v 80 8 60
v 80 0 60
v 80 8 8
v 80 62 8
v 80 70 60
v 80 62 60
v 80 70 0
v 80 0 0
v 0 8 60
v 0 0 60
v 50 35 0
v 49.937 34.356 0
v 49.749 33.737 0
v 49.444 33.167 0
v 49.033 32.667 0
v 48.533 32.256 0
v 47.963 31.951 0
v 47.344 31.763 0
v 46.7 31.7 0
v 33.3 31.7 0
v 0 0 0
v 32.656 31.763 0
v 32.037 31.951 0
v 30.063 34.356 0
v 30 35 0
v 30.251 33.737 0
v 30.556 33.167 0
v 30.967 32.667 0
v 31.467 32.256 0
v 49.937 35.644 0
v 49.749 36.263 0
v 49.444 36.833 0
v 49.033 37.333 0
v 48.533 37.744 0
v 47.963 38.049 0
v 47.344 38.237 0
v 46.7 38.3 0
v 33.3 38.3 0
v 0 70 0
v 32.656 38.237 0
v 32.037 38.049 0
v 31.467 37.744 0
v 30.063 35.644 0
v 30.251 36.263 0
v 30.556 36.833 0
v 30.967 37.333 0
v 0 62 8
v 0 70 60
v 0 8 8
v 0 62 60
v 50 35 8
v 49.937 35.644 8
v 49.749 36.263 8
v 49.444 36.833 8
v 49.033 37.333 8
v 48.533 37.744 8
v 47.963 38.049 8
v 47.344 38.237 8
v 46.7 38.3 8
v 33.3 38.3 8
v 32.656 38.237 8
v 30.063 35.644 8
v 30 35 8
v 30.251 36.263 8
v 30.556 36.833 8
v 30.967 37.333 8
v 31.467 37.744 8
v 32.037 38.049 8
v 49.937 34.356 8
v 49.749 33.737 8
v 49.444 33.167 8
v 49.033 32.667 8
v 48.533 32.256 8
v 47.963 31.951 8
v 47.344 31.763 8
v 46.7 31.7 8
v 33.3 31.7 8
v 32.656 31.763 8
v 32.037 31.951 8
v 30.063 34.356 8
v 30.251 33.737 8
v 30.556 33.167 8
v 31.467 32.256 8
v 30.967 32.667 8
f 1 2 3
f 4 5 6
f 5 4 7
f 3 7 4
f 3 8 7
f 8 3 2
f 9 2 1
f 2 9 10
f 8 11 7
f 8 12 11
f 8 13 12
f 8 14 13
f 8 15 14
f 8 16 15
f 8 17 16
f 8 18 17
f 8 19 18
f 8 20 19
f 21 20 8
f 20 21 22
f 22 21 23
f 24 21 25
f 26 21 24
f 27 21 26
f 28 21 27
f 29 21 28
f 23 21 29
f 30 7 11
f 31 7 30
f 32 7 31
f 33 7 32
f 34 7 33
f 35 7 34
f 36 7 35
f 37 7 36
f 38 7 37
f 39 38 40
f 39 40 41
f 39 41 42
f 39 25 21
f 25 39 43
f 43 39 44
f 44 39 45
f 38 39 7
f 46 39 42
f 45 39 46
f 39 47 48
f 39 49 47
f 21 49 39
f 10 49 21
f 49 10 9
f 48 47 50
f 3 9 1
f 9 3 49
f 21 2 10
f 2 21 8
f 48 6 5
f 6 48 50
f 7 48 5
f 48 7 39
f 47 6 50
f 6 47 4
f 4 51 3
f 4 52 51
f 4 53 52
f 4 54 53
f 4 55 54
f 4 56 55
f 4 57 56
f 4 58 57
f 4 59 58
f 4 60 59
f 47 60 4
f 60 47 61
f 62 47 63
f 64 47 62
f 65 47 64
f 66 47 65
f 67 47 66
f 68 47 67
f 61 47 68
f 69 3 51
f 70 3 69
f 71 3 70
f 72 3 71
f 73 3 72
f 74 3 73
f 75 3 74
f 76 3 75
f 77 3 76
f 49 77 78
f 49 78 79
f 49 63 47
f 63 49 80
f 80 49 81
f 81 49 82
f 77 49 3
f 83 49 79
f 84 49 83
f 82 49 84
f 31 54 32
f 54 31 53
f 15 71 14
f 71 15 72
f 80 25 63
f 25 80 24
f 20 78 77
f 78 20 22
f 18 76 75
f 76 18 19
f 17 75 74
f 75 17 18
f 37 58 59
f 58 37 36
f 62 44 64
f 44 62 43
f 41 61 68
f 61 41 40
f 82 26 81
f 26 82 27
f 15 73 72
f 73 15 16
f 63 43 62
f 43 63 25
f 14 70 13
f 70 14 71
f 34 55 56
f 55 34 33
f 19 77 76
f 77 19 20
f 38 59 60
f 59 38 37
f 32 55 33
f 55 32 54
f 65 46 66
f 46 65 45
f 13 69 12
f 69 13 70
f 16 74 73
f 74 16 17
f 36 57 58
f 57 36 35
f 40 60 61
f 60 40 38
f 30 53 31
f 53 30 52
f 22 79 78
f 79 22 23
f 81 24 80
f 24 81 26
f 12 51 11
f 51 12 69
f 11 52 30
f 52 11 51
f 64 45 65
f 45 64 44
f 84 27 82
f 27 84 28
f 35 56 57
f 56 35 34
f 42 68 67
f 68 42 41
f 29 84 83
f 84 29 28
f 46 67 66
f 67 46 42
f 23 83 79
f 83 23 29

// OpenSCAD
$fn = 32;

// ----------------------------------------------------------------------
// U-bracket: 80 x 70 x 60 mm
// ----------------------------------------------------------------------

// --- parameters (mm) ---
rail_len = 80;            // outer length, X
jaw_w = 70;               // outer width, Y
jaw_h = 60;               // upright height, Z
web_t = 8;                // wall thickness
hole_d = 6.6;             // clearance for M6
slot_l = 20;              // slot length

module hole_z(px, py) {
  translate([px, py, -2.5]) cylinder(h = web_t + 5, d = hole_d);
}
module hole_y_pz(pz) {
  /* through both uprights along Y */
  translate([0, -2.5, pz]) rotate([-90, 0, 0]) cylinder(h = jaw_w + 5, d = hole_d);
}
module slot_z(px, py) {
  hull() {
    translate([px - (slot_l - hole_d) / 2, py, -2.5]) cylinder(h = web_t + 5, d = hole_d);
    translate([px + (slot_l - hole_d) / 2, py, -2.5]) cylinder(h = web_t + 5, d = hole_d);
  }
}

module base() {
  cube([rail_len, jaw_w, web_t]);
}

module uprights() {
  cube([rail_len, web_t, jaw_h]);
  translate([0, jaw_w - web_t, 0]) cube([rail_len, web_t, jaw_h]);
}

difference() {
  union() {
    base();
    uprights();
  }
  slot_z(40, 35);
}
